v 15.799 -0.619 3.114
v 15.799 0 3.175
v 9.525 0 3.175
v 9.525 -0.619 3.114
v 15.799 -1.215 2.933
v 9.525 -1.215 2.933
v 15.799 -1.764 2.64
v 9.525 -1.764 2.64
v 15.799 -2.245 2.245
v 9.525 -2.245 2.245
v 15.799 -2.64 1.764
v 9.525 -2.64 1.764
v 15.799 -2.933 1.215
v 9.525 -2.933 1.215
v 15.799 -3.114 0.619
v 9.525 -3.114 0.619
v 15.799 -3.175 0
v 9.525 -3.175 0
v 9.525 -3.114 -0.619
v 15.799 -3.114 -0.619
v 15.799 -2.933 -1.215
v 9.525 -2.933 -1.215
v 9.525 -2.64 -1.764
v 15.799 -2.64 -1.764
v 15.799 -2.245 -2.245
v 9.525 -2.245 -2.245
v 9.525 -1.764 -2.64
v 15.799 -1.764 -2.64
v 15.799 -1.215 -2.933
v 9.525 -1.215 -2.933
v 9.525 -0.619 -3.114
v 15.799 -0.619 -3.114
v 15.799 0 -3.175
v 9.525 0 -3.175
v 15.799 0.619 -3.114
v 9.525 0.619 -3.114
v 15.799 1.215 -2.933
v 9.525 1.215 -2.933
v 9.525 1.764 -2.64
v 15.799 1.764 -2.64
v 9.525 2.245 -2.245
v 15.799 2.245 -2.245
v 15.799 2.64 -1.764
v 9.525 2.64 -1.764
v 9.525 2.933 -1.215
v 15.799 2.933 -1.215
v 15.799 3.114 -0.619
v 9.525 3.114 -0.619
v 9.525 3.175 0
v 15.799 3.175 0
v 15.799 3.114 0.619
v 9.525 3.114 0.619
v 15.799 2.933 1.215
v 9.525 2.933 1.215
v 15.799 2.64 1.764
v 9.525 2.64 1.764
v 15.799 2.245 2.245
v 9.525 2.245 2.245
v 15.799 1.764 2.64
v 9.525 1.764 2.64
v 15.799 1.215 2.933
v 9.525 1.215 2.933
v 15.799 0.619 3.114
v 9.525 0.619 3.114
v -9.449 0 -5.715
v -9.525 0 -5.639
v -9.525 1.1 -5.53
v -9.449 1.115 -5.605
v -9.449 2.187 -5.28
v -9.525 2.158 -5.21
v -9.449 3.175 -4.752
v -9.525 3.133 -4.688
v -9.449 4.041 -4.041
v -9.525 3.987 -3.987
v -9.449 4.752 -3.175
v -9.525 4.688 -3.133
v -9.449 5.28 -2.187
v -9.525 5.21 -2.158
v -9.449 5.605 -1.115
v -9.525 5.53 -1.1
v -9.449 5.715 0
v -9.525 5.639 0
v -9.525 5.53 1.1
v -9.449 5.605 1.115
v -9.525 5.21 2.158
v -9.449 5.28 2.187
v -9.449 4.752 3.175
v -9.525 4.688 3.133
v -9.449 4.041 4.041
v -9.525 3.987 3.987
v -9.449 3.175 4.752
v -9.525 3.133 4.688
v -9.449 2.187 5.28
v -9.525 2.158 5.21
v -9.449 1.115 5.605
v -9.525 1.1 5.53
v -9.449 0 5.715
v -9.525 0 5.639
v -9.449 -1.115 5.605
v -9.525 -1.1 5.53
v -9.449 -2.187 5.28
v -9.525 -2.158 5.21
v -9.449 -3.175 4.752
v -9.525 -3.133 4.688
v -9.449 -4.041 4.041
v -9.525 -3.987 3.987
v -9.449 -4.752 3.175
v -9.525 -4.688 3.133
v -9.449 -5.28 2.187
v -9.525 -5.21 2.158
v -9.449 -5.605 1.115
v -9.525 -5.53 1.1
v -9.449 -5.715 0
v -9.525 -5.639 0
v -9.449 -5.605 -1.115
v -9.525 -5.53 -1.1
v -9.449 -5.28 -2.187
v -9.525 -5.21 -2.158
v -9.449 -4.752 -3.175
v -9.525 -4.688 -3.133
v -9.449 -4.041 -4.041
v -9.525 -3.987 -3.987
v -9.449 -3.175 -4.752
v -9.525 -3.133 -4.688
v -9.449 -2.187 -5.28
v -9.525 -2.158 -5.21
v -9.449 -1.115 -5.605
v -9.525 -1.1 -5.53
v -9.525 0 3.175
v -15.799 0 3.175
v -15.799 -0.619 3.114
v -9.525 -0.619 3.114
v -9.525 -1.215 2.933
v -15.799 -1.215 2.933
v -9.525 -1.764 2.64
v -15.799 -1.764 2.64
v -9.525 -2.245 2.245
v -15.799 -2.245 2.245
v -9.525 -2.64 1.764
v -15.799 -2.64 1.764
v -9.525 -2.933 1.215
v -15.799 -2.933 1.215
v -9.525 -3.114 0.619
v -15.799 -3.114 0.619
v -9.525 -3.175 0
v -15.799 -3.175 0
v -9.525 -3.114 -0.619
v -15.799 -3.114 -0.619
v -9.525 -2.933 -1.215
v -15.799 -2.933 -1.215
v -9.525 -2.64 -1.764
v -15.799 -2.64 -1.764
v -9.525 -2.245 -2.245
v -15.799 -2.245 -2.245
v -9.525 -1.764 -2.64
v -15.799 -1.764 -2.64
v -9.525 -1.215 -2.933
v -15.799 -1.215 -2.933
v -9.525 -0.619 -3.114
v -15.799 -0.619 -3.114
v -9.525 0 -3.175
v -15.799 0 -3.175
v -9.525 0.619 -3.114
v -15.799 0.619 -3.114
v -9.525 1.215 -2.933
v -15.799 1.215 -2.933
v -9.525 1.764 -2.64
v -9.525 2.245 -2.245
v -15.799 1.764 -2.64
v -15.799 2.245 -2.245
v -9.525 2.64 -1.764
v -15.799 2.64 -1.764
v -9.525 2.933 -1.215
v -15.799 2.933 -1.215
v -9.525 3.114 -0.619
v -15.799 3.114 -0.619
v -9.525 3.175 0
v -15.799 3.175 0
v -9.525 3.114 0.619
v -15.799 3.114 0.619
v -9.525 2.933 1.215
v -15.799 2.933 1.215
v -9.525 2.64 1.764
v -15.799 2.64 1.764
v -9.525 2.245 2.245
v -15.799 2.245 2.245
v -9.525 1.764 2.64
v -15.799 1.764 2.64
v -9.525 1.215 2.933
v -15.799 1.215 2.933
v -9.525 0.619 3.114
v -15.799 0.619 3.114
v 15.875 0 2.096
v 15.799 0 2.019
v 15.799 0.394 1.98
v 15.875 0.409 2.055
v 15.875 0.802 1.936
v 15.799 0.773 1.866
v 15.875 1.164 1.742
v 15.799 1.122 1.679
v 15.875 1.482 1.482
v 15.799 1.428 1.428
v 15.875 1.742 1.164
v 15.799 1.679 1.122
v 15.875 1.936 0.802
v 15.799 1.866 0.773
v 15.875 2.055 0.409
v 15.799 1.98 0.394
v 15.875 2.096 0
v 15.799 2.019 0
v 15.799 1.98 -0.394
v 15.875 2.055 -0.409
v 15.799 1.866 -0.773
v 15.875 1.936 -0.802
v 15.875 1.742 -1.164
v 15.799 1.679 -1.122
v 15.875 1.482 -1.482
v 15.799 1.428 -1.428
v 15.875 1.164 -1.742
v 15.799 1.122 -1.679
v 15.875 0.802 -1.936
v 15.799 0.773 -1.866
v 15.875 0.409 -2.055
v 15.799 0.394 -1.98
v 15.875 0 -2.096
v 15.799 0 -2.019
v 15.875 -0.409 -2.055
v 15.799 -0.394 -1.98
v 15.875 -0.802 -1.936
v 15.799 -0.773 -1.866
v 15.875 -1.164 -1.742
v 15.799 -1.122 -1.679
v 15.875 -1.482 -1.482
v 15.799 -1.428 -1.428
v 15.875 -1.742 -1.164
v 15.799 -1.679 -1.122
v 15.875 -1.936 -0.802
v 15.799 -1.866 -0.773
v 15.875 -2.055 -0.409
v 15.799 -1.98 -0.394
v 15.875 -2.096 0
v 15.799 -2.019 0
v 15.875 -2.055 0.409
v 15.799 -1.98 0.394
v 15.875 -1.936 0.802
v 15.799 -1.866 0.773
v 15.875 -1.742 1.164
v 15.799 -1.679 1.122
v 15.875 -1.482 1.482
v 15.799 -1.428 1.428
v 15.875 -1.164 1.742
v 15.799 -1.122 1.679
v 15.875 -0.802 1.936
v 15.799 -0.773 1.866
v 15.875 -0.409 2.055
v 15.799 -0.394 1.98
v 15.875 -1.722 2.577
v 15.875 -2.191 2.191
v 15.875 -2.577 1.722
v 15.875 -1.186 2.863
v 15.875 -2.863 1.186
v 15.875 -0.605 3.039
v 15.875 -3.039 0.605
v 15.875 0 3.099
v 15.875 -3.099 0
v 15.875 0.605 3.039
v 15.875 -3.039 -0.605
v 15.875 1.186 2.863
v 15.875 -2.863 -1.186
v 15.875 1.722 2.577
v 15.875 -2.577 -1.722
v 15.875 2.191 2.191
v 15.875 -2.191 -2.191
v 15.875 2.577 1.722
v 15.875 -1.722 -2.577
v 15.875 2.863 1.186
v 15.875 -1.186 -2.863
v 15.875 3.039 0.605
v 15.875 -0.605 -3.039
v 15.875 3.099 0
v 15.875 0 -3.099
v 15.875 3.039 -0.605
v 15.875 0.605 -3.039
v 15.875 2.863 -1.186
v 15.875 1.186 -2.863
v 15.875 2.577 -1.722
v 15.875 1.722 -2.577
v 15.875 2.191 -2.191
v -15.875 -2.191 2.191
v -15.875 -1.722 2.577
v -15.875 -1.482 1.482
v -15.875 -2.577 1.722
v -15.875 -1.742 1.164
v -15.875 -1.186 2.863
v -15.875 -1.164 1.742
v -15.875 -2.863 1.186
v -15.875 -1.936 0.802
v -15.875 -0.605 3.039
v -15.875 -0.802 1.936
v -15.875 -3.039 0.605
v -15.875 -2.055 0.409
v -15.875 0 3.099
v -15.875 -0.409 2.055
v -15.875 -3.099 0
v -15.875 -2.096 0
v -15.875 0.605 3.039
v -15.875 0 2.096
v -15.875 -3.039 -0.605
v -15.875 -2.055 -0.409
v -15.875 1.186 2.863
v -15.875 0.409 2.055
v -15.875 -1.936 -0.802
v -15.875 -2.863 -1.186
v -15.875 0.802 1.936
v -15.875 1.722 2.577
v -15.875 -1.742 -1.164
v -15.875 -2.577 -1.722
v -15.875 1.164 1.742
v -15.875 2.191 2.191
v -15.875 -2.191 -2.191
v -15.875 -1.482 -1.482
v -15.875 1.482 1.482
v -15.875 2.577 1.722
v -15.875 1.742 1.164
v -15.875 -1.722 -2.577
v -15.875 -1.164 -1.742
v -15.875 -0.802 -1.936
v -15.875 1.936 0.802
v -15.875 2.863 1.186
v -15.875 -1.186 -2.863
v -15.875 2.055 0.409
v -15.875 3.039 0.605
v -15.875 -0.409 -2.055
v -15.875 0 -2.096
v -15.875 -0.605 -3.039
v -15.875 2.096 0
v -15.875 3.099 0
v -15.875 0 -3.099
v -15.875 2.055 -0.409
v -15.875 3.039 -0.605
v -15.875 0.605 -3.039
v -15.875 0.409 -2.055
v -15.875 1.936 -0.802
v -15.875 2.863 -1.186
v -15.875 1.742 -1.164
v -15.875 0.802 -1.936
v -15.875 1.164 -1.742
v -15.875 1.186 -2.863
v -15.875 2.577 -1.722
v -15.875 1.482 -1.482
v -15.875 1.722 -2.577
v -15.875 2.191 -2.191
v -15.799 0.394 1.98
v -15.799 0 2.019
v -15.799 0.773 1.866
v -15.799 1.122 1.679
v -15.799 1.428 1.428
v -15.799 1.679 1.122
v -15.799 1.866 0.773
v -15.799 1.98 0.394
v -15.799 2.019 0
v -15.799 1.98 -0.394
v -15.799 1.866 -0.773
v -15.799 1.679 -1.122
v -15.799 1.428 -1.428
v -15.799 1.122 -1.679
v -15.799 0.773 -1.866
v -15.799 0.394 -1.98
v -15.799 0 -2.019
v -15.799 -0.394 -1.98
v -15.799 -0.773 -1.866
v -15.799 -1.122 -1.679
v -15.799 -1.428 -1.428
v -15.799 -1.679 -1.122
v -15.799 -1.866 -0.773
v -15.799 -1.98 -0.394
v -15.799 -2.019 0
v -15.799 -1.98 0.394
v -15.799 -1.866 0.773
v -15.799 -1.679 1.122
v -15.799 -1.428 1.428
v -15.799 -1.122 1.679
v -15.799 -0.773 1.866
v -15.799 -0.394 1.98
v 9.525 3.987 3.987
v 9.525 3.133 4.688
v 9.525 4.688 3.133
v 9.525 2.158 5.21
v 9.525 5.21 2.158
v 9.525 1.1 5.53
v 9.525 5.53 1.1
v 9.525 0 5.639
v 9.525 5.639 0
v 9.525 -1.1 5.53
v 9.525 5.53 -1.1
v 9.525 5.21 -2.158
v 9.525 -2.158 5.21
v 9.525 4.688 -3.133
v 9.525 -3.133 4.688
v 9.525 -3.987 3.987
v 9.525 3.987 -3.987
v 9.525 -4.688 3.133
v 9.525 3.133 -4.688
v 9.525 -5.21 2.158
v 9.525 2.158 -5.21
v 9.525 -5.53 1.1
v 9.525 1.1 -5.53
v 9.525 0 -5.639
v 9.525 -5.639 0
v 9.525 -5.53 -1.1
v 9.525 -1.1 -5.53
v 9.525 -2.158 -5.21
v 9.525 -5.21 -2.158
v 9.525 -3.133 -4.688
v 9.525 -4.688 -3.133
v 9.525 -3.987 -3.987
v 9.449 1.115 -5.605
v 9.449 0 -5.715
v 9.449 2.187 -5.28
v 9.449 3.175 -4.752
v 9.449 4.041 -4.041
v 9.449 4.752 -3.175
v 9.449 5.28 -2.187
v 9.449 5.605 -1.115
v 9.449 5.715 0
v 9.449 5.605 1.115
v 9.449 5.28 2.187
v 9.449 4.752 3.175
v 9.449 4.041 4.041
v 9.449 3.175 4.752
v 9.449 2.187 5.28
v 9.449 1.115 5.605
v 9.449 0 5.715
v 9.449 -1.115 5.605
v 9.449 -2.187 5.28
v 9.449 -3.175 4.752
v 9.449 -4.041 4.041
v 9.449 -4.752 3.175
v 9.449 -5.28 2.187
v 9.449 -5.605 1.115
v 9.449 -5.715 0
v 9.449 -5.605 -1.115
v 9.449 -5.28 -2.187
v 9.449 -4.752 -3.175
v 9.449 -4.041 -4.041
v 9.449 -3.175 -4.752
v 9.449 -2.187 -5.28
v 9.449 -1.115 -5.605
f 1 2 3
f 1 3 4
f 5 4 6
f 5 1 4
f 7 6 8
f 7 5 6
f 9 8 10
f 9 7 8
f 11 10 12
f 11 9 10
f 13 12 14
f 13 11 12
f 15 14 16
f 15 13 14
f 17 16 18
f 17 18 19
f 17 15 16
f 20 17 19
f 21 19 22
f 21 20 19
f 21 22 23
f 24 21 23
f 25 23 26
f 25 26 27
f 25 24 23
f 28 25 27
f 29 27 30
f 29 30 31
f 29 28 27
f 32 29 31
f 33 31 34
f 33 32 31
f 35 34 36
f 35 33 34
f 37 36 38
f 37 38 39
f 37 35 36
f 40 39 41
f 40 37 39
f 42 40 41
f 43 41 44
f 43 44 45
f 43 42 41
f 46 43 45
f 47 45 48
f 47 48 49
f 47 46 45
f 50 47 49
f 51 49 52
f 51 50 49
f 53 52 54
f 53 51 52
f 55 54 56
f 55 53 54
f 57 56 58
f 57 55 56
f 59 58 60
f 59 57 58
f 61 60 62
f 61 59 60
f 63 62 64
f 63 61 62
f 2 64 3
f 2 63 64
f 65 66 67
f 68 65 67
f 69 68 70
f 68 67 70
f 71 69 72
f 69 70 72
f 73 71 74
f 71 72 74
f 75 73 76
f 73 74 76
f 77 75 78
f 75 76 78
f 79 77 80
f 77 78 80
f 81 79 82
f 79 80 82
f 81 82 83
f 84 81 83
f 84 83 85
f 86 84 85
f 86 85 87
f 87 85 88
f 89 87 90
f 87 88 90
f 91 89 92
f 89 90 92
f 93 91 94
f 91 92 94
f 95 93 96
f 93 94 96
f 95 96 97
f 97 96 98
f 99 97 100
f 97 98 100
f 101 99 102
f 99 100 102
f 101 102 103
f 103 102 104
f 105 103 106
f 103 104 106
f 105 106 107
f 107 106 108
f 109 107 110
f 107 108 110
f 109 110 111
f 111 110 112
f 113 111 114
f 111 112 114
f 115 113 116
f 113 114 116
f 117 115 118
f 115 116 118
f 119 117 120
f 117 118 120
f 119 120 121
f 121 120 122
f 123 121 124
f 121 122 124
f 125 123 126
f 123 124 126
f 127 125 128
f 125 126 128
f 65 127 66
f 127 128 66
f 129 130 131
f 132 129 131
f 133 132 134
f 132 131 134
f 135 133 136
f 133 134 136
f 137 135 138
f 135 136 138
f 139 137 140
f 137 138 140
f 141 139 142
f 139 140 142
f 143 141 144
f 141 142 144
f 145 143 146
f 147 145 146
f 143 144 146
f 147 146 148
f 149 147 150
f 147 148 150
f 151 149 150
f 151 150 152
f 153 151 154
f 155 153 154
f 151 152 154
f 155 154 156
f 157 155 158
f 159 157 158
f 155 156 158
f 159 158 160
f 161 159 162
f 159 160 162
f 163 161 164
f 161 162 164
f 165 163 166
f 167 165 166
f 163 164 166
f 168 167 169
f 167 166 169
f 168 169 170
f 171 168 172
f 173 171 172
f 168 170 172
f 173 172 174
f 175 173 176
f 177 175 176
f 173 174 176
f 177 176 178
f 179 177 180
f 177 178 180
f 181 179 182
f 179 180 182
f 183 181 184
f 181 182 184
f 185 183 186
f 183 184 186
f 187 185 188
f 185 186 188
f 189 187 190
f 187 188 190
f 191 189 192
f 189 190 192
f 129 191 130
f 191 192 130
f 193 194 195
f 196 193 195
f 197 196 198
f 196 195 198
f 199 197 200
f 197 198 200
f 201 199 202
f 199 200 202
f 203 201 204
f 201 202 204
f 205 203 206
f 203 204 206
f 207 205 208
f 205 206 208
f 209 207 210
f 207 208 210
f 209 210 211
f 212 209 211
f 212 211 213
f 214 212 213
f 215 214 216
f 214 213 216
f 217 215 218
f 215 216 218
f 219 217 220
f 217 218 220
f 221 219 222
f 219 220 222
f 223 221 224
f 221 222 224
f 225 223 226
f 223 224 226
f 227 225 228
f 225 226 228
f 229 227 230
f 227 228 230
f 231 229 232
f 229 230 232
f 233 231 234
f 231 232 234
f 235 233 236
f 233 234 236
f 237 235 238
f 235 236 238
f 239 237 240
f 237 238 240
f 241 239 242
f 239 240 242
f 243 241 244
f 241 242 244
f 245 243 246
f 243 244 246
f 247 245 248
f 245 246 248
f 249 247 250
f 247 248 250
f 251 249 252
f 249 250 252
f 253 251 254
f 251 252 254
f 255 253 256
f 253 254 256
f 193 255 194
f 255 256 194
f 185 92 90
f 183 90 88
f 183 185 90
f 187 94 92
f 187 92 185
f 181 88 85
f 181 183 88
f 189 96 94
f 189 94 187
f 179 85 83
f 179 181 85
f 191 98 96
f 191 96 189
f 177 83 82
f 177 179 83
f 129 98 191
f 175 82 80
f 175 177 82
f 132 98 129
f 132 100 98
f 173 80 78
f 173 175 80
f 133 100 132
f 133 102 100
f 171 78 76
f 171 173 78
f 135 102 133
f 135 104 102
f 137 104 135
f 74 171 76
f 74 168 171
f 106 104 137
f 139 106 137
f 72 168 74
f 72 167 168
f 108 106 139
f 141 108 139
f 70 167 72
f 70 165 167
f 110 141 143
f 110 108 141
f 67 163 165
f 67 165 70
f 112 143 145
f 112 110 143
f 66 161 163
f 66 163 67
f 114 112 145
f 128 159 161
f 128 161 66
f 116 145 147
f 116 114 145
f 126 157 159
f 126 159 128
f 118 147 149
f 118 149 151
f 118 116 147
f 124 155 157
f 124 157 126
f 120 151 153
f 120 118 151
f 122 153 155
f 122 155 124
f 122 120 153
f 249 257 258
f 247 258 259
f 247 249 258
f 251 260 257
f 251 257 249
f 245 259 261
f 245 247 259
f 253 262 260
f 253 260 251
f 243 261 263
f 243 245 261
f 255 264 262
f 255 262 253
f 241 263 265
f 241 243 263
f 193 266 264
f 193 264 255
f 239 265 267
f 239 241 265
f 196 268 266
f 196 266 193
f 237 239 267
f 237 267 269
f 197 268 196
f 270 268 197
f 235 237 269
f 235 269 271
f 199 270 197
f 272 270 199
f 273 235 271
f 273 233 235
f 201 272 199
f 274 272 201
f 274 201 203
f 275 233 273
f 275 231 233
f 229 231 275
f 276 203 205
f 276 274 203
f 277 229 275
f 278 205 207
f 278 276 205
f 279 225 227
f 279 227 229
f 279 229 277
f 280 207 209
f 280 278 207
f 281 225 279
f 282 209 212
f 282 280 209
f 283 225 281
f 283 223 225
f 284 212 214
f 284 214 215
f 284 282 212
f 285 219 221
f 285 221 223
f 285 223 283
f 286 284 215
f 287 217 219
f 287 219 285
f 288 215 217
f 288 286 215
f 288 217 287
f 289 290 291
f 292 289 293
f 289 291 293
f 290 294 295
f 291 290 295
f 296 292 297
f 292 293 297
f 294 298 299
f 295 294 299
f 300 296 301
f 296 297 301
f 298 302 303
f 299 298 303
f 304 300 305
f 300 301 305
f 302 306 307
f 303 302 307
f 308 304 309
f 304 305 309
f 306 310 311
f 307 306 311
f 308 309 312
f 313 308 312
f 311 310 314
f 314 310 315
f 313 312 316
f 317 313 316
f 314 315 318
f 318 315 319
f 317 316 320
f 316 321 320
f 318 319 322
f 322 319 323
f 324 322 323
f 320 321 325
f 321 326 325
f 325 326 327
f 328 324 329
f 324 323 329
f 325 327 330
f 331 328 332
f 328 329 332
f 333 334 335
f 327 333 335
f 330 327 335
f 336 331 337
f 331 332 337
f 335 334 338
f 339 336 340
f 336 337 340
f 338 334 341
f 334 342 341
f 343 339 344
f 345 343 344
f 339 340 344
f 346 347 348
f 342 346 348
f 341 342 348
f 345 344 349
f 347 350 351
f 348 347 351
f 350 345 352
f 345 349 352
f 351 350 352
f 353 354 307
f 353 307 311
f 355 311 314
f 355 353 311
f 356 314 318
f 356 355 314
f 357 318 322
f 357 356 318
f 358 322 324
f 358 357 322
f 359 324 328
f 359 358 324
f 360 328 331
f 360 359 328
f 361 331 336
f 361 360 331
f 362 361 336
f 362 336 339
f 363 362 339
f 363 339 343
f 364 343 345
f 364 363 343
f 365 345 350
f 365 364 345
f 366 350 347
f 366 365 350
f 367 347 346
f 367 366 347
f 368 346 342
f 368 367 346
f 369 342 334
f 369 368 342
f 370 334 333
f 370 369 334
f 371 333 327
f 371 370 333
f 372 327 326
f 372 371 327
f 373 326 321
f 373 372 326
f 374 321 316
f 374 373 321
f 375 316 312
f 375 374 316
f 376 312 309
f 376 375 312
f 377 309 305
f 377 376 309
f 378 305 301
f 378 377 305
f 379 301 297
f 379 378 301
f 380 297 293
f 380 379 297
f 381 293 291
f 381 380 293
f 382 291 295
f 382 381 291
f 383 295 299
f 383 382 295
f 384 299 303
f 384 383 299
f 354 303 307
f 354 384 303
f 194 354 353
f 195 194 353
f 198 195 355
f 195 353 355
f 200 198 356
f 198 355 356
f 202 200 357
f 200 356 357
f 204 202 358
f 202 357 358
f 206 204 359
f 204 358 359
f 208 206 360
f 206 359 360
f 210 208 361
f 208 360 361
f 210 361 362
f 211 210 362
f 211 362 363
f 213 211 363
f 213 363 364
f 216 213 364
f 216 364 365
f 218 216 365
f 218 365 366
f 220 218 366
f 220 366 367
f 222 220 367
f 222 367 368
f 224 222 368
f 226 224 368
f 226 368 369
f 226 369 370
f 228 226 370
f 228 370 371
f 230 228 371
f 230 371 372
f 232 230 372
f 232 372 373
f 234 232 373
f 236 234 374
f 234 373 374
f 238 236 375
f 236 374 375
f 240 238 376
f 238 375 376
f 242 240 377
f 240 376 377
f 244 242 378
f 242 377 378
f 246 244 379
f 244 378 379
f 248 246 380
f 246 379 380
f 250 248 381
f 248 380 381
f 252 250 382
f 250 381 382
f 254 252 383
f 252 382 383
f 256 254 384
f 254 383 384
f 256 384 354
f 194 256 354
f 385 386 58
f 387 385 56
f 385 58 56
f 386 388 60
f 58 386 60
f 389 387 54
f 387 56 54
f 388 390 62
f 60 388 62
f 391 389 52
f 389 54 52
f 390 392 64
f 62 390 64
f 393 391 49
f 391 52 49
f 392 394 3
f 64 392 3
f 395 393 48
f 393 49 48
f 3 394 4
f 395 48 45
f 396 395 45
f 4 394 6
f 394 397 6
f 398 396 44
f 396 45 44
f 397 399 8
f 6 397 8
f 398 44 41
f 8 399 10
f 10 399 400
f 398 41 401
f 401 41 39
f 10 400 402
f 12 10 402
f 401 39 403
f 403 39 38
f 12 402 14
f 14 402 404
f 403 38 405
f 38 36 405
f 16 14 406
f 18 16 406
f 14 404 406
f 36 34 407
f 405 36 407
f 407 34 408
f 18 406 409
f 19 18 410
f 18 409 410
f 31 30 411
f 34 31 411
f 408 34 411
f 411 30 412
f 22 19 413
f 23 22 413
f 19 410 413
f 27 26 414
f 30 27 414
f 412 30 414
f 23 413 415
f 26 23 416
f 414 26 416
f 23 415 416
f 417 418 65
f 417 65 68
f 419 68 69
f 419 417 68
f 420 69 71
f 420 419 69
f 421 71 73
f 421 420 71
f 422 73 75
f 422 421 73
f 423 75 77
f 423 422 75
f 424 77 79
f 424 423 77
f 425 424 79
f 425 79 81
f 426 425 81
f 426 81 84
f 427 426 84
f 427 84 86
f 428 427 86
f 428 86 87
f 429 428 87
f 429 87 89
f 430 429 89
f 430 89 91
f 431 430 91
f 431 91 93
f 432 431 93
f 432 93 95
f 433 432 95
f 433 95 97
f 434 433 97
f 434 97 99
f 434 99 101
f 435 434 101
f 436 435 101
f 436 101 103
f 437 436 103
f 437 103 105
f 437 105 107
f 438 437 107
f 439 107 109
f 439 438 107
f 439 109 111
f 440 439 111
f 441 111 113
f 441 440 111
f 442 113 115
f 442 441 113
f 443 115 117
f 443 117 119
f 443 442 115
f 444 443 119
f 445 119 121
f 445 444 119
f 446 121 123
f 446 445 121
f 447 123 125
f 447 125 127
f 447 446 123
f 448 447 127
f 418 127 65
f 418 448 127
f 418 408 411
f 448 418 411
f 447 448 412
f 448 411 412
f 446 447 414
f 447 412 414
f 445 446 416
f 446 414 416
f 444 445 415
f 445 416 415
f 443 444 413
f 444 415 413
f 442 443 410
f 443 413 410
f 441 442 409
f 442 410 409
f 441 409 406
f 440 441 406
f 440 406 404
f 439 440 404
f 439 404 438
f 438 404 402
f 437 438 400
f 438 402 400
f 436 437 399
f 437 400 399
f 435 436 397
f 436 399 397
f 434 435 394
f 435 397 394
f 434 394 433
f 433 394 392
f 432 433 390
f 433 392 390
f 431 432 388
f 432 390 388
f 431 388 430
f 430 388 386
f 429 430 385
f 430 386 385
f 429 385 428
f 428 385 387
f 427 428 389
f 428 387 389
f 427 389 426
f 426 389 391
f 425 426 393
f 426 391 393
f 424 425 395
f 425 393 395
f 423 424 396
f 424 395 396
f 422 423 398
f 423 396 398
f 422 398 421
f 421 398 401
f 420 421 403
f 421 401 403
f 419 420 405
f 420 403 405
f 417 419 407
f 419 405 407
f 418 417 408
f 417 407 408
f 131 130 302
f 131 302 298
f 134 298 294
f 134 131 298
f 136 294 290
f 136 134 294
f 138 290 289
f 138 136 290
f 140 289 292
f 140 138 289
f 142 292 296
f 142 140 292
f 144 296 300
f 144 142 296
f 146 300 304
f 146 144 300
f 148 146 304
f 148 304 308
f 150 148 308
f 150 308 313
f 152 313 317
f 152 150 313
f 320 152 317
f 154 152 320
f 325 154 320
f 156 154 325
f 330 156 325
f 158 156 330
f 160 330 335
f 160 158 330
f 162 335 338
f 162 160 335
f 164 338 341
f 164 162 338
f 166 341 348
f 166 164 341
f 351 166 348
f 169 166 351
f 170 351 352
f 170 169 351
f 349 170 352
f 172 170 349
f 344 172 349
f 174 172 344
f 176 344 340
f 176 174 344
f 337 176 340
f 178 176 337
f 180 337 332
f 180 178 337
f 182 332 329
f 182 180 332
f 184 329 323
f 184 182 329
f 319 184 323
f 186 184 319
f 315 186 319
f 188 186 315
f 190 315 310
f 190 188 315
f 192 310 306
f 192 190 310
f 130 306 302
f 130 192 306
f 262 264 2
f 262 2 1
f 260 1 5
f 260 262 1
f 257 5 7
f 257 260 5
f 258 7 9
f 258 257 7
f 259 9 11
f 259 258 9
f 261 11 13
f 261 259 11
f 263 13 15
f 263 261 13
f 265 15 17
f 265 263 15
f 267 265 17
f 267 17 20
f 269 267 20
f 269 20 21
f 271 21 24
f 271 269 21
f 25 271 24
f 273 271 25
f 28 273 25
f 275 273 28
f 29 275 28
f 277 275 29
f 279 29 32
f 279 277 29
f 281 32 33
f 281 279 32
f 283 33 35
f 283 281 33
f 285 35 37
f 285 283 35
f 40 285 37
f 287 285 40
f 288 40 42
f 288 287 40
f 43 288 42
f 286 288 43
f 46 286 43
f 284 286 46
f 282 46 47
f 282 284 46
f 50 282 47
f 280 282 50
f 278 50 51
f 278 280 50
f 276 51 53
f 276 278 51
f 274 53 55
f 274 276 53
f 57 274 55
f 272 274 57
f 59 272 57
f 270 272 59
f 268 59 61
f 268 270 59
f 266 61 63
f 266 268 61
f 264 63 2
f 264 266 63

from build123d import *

# Parameters (mm, degrees)
SKETCH34_R                  = 5.715
BOSS_EXTRUDE2_DEPTH         = 15.875
F_21_0_159_DIAMETER_HOLE2_D = 4.0386
SKETCH39_W                  = 6.35
SKETCH39_H                  = 2.54
CHAMFER1_SIZE               = 0.0762
CHAMFER2_SIZE               = 0.0762
CHAMFER8_SIZE               = 0.0762


with BuildPart() as part:
    # Sketch34 → Boss-Extrude2 (new, symmetric)
    with BuildSketch(Plane(origin=(0, 0, 0), x_dir=(0, 0, -1), z_dir=(1, 0, 0))):
        Circle(SKETCH34_R)
    extrude(amount=BOSS_EXTRUDE2_DEPTH, both=True)

    # #21 (0.159) Diameter Hole2 (through all)
    with Locations(Plane(origin=(15.875, 0, 0), x_dir=(0, 0, -1), z_dir=(1, 0, 0))):
        with Locations((0, 0)):
            Hole(F_21_0_159_DIAMETER_HOLE2_D / 2)

    # Sketch39 → Cut-Revolve1 (revolve, cut)
    with BuildSketch(Plane.XY, mode=Mode.PRIVATE) as cut_revolve1_sk:
        with Locations((12.7, 4.445)):
            Rectangle(SKETCH39_W, SKETCH39_H)
    cut_revolve1 = revolve(cut_revolve1_sk.sketch.rotate(Axis((0, 0, 0), (1, 0, 0)), 90), axis=Axis((0, 0, 0), (1, 0, 0)), mode=Mode.SUBTRACT)

    # Chamfer1
    chamfer1_edges = [part.edges().sort_by_distance(p)[0] for p in [
        (15.875, 0, -3.175),
        (9.525, 0, 5.715),
    ]]
    chamfer(chamfer1_edges, length=CHAMFER1_SIZE)

    # Mirror1: Cut-Revolve1 across plane
    add(cut_revolve1.mirror(Plane(origin=(0, 0, 0), x_dir=(0, 0, 1), z_dir=(1, 0, 0))), mode=Mode.SUBTRACT)

    # Chamfer2
    chamfer2_edges = [part.edges().sort_by_distance(p)[0] for p in [
        (-15.875, 0, -3.175),
        (-9.525, 0, 5.715),
    ]]
    chamfer(chamfer2_edges, length=CHAMFER2_SIZE)

    # Chamfer8
    chamfer8_edges = [part.edges().sort_by_distance(p)[0] for p in [
        (15.875, 0, -2.0193),
        (-15.875, 0, -2.0193),
    ]]
    chamfer(chamfer8_edges, length=CHAMFER8_SIZE)


solid = part.part
